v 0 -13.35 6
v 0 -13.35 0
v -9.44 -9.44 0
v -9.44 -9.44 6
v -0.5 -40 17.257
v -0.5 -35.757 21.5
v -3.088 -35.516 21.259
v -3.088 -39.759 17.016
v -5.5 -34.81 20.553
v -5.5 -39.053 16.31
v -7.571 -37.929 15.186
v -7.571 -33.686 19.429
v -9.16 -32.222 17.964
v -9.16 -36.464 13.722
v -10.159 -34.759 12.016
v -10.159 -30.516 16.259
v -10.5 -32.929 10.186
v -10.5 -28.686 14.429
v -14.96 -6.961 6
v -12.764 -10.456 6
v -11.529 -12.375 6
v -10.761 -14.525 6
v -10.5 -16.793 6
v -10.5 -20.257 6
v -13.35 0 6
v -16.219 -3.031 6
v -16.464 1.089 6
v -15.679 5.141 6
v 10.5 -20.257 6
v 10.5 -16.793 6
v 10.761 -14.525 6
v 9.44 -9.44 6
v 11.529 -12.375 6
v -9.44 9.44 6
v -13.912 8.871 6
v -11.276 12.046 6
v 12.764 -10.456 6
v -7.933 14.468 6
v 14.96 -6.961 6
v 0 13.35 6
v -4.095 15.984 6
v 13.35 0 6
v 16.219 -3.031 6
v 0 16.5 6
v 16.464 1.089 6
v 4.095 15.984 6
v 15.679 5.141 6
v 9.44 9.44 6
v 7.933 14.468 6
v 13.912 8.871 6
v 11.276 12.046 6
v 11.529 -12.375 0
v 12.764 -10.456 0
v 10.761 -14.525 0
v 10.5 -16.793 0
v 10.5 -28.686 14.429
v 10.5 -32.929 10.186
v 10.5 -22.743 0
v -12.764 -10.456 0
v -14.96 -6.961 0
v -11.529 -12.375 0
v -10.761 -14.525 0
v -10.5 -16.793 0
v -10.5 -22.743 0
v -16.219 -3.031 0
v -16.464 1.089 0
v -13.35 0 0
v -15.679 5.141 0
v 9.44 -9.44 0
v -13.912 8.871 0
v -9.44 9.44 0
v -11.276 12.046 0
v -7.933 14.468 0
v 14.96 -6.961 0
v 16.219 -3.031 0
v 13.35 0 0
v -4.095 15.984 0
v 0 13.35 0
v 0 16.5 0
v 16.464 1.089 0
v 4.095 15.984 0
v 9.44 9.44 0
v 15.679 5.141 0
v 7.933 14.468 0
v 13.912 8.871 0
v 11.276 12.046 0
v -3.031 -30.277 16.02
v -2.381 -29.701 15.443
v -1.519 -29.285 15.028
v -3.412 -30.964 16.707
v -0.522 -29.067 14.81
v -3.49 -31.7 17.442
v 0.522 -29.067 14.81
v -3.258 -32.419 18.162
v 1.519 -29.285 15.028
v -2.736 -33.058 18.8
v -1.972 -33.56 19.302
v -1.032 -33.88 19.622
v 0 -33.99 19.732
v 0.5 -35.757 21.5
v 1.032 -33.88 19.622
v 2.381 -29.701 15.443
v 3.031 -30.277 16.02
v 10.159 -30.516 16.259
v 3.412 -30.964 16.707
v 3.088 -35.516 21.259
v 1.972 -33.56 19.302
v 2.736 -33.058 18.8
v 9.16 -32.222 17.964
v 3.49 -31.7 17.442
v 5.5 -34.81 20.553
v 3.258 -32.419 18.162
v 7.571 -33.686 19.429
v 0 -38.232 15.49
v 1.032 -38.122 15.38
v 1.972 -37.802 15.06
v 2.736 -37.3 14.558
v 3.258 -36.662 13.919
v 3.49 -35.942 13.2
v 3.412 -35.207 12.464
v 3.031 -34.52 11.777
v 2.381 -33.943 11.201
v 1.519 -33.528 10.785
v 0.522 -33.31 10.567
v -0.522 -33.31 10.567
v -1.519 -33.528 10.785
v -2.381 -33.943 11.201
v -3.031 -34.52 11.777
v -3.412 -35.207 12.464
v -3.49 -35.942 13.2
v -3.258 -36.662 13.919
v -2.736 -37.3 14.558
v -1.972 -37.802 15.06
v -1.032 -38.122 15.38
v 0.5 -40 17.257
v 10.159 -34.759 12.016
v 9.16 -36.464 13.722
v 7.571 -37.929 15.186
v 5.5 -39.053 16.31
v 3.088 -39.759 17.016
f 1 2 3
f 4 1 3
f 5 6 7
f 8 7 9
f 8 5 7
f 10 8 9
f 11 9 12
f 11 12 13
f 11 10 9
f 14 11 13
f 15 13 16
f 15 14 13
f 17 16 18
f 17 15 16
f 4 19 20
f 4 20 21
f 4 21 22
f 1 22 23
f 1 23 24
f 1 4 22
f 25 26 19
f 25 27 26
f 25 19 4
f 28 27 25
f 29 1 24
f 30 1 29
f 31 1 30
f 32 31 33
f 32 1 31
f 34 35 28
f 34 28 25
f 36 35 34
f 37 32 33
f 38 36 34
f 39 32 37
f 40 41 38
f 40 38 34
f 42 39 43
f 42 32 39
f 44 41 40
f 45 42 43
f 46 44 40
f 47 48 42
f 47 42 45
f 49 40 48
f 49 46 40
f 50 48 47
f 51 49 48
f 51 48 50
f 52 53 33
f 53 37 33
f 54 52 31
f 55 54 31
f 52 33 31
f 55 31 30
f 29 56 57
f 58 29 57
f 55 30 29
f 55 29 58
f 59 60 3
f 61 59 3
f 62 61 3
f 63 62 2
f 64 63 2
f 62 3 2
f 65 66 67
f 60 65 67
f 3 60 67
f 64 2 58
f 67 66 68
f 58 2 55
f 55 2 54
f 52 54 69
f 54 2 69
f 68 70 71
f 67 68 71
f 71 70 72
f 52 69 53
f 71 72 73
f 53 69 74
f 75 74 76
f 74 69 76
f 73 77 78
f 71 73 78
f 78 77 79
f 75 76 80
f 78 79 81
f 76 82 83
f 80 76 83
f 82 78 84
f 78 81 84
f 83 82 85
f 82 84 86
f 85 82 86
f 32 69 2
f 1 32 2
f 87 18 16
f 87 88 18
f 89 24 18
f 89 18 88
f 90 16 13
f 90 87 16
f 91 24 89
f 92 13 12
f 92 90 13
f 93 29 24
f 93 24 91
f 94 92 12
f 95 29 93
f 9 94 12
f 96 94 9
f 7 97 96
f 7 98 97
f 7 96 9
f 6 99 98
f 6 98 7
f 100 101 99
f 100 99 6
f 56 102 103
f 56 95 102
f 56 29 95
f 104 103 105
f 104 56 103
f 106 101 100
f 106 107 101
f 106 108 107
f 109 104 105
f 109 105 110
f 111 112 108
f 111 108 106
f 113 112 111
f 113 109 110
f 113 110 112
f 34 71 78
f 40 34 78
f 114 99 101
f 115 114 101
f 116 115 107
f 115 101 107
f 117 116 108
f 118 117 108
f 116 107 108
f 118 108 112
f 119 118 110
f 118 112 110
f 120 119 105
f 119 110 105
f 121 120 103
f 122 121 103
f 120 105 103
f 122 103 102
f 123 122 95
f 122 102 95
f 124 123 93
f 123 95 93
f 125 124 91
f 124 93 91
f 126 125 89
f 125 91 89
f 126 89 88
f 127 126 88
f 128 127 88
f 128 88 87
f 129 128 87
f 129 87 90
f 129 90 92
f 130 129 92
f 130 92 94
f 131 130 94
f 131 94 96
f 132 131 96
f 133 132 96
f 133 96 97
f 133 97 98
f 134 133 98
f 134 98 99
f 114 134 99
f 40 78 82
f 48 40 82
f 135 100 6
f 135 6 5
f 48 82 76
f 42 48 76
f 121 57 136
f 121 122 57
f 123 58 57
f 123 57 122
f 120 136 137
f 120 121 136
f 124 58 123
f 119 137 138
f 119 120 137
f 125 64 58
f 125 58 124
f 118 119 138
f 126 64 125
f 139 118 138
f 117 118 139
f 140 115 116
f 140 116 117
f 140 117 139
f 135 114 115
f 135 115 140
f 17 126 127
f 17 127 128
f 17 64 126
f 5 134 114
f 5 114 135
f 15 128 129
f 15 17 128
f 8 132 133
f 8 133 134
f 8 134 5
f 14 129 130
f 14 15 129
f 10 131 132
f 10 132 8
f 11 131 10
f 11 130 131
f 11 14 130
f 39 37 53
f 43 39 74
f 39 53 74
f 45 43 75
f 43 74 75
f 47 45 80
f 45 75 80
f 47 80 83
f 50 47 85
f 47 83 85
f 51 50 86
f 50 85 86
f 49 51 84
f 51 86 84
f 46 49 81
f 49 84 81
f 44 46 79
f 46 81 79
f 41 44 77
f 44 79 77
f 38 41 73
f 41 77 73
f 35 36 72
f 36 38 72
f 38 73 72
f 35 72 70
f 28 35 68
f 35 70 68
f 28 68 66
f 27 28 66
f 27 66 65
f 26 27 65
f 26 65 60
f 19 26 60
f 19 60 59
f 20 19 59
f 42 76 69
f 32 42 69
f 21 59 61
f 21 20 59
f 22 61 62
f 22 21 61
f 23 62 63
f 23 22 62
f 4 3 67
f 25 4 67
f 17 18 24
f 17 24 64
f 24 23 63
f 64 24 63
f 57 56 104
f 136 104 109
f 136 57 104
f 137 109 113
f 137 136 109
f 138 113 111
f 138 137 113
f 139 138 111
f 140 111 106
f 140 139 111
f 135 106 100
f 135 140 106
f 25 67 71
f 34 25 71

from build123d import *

# Parameters (mm, degrees)
SKETCH_1_R               = 16.5
EXTRUDE_1_DEPTH          = 6
EXTRUDE_START            = -6
EXTRUDE_2_DEPTH          = 6
EXTRUDE_3_DEPTH          = 21
SKETCH_4_R               = 3.5
CUT_EXTRUDE_1_DEPTH      = 47.608743815
CUT_EXTRUDE_3_DEPTH      = 53.832281798
CUT_EXTRUDE_3_DEPTH_BACK = 53.832281798
EXTRUDE_4_DEPTH          = 21
FILLET_3_R               = 10


with BuildPart() as part:
    # 草图1 → 凸台-拉伸1 (new body)
    with BuildSketch(Plane.XY):
        Circle(SKETCH_1_R)
        Polygon((13.35, 0), (9.439875529, -9.439875529), (0, -13.35), (-9.439875529, -9.439875529), (-13.35, 0), (-9.439875529, 9.439875529), (0, 13.35), (9.439875529, 9.439875529), align=None, mode=Mode.SUBTRACT)
    extrude(amount=EXTRUDE_1_DEPTH)

    # 草图2 → 凸台-拉伸2 (add)
    with BuildSketch(Plane.XY.offset(6).offset(EXTRUDE_START)):
        with BuildLine():
            Line((-10.5, -12.727922061), (-10.5, -30))
            Line((-10.5, -30), (10.5, -30))
            Line((10.5, -30), (10.5, -12.727922061))
            ThreePointArc((10.5, -12.727922061), (0, -16.5), (-10.5, -12.727922061))
        make_face()
    extrude(amount=EXTRUDE_2_DEPTH)

    # 草图3 → 凸台-拉伸3 (add)
    with BuildSketch(Plane(origin=(10.5, 0, 0), x_dir=(0, 0, -1), z_dir=(1, 0, 0))):
        Polygon((-6, -24), (-9.742640687, -24), (-15.742640687, -30), (-7.257359313, -30), (-6, -28.742640687), align=None)
        Polygon((-6, -30), (-6, -28.742640687), (-7.257359313, -30), align=None)
        Polygon((-7.257359313, -30), (-15.742640687, -30), (-21.5, -35.757359313), (-17.257359313, -40), align=None)
    extrude(amount=-EXTRUDE_3_DEPTH)

    # 草图4 → 切除-拉伸1 (cut, through all)
    with BuildSketch(Plane(origin=(0, -7.128679656, -7.128679656), x_dir=(1, 0, 0), z_dir=(0, 0.7071067811865438, 0.7071067811865513))):
        with Locations(Location((0, -34.487067043, 0), (0, 0, 270))):
            Circle(SKETCH_4_R)
    extrude(amount=-CUT_EXTRUDE_1_DEPTH, mode=Mode.SUBTRACT)

    # 草图5 → 切除-拉伸3 (cut, two sides: drawn at the far end of the back side and taken through both)
    with BuildSketch(Plane(origin=(10.5, 0, 0), x_dir=(0, 0, -1), z_dir=(1, 0, 0)).offset(-CUT_EXTRUDE_3_DEPTH_BACK)):
        Polygon((0, -22.742640687), (-7.257359313, -30), (0, -30), align=None)
    extrude(amount=CUT_EXTRUDE_3_DEPTH + CUT_EXTRUDE_3_DEPTH_BACK, mode=Mode.SUBTRACT)

    # 草图6 → 凸台-拉伸4 (add)
    with BuildSketch(Plane(origin=(10.5, 0, 0), x_dir=(0, 0, -1), z_dir=(1, 0, 0))):
        Polygon((-6, -20.257359313), (-9.742640687, -24), (-6, -24), align=None)
    extrude(amount=-EXTRUDE_4_DEPTH)

    # 圆角3
    fillet_3_edges = [part.edges().sort_by_distance(p)[0] for p in [
        (-10.5, -12.727922061, 3),
        (10.5, -12.727922061, 3),
        (-10.5, -37.878679656, 19.378679656),
        (10.5, -37.878679656, 19.378679656),
    ]]
    fillet(fillet_3_edges, radius=FILLET_3_R)


solid = part.part
